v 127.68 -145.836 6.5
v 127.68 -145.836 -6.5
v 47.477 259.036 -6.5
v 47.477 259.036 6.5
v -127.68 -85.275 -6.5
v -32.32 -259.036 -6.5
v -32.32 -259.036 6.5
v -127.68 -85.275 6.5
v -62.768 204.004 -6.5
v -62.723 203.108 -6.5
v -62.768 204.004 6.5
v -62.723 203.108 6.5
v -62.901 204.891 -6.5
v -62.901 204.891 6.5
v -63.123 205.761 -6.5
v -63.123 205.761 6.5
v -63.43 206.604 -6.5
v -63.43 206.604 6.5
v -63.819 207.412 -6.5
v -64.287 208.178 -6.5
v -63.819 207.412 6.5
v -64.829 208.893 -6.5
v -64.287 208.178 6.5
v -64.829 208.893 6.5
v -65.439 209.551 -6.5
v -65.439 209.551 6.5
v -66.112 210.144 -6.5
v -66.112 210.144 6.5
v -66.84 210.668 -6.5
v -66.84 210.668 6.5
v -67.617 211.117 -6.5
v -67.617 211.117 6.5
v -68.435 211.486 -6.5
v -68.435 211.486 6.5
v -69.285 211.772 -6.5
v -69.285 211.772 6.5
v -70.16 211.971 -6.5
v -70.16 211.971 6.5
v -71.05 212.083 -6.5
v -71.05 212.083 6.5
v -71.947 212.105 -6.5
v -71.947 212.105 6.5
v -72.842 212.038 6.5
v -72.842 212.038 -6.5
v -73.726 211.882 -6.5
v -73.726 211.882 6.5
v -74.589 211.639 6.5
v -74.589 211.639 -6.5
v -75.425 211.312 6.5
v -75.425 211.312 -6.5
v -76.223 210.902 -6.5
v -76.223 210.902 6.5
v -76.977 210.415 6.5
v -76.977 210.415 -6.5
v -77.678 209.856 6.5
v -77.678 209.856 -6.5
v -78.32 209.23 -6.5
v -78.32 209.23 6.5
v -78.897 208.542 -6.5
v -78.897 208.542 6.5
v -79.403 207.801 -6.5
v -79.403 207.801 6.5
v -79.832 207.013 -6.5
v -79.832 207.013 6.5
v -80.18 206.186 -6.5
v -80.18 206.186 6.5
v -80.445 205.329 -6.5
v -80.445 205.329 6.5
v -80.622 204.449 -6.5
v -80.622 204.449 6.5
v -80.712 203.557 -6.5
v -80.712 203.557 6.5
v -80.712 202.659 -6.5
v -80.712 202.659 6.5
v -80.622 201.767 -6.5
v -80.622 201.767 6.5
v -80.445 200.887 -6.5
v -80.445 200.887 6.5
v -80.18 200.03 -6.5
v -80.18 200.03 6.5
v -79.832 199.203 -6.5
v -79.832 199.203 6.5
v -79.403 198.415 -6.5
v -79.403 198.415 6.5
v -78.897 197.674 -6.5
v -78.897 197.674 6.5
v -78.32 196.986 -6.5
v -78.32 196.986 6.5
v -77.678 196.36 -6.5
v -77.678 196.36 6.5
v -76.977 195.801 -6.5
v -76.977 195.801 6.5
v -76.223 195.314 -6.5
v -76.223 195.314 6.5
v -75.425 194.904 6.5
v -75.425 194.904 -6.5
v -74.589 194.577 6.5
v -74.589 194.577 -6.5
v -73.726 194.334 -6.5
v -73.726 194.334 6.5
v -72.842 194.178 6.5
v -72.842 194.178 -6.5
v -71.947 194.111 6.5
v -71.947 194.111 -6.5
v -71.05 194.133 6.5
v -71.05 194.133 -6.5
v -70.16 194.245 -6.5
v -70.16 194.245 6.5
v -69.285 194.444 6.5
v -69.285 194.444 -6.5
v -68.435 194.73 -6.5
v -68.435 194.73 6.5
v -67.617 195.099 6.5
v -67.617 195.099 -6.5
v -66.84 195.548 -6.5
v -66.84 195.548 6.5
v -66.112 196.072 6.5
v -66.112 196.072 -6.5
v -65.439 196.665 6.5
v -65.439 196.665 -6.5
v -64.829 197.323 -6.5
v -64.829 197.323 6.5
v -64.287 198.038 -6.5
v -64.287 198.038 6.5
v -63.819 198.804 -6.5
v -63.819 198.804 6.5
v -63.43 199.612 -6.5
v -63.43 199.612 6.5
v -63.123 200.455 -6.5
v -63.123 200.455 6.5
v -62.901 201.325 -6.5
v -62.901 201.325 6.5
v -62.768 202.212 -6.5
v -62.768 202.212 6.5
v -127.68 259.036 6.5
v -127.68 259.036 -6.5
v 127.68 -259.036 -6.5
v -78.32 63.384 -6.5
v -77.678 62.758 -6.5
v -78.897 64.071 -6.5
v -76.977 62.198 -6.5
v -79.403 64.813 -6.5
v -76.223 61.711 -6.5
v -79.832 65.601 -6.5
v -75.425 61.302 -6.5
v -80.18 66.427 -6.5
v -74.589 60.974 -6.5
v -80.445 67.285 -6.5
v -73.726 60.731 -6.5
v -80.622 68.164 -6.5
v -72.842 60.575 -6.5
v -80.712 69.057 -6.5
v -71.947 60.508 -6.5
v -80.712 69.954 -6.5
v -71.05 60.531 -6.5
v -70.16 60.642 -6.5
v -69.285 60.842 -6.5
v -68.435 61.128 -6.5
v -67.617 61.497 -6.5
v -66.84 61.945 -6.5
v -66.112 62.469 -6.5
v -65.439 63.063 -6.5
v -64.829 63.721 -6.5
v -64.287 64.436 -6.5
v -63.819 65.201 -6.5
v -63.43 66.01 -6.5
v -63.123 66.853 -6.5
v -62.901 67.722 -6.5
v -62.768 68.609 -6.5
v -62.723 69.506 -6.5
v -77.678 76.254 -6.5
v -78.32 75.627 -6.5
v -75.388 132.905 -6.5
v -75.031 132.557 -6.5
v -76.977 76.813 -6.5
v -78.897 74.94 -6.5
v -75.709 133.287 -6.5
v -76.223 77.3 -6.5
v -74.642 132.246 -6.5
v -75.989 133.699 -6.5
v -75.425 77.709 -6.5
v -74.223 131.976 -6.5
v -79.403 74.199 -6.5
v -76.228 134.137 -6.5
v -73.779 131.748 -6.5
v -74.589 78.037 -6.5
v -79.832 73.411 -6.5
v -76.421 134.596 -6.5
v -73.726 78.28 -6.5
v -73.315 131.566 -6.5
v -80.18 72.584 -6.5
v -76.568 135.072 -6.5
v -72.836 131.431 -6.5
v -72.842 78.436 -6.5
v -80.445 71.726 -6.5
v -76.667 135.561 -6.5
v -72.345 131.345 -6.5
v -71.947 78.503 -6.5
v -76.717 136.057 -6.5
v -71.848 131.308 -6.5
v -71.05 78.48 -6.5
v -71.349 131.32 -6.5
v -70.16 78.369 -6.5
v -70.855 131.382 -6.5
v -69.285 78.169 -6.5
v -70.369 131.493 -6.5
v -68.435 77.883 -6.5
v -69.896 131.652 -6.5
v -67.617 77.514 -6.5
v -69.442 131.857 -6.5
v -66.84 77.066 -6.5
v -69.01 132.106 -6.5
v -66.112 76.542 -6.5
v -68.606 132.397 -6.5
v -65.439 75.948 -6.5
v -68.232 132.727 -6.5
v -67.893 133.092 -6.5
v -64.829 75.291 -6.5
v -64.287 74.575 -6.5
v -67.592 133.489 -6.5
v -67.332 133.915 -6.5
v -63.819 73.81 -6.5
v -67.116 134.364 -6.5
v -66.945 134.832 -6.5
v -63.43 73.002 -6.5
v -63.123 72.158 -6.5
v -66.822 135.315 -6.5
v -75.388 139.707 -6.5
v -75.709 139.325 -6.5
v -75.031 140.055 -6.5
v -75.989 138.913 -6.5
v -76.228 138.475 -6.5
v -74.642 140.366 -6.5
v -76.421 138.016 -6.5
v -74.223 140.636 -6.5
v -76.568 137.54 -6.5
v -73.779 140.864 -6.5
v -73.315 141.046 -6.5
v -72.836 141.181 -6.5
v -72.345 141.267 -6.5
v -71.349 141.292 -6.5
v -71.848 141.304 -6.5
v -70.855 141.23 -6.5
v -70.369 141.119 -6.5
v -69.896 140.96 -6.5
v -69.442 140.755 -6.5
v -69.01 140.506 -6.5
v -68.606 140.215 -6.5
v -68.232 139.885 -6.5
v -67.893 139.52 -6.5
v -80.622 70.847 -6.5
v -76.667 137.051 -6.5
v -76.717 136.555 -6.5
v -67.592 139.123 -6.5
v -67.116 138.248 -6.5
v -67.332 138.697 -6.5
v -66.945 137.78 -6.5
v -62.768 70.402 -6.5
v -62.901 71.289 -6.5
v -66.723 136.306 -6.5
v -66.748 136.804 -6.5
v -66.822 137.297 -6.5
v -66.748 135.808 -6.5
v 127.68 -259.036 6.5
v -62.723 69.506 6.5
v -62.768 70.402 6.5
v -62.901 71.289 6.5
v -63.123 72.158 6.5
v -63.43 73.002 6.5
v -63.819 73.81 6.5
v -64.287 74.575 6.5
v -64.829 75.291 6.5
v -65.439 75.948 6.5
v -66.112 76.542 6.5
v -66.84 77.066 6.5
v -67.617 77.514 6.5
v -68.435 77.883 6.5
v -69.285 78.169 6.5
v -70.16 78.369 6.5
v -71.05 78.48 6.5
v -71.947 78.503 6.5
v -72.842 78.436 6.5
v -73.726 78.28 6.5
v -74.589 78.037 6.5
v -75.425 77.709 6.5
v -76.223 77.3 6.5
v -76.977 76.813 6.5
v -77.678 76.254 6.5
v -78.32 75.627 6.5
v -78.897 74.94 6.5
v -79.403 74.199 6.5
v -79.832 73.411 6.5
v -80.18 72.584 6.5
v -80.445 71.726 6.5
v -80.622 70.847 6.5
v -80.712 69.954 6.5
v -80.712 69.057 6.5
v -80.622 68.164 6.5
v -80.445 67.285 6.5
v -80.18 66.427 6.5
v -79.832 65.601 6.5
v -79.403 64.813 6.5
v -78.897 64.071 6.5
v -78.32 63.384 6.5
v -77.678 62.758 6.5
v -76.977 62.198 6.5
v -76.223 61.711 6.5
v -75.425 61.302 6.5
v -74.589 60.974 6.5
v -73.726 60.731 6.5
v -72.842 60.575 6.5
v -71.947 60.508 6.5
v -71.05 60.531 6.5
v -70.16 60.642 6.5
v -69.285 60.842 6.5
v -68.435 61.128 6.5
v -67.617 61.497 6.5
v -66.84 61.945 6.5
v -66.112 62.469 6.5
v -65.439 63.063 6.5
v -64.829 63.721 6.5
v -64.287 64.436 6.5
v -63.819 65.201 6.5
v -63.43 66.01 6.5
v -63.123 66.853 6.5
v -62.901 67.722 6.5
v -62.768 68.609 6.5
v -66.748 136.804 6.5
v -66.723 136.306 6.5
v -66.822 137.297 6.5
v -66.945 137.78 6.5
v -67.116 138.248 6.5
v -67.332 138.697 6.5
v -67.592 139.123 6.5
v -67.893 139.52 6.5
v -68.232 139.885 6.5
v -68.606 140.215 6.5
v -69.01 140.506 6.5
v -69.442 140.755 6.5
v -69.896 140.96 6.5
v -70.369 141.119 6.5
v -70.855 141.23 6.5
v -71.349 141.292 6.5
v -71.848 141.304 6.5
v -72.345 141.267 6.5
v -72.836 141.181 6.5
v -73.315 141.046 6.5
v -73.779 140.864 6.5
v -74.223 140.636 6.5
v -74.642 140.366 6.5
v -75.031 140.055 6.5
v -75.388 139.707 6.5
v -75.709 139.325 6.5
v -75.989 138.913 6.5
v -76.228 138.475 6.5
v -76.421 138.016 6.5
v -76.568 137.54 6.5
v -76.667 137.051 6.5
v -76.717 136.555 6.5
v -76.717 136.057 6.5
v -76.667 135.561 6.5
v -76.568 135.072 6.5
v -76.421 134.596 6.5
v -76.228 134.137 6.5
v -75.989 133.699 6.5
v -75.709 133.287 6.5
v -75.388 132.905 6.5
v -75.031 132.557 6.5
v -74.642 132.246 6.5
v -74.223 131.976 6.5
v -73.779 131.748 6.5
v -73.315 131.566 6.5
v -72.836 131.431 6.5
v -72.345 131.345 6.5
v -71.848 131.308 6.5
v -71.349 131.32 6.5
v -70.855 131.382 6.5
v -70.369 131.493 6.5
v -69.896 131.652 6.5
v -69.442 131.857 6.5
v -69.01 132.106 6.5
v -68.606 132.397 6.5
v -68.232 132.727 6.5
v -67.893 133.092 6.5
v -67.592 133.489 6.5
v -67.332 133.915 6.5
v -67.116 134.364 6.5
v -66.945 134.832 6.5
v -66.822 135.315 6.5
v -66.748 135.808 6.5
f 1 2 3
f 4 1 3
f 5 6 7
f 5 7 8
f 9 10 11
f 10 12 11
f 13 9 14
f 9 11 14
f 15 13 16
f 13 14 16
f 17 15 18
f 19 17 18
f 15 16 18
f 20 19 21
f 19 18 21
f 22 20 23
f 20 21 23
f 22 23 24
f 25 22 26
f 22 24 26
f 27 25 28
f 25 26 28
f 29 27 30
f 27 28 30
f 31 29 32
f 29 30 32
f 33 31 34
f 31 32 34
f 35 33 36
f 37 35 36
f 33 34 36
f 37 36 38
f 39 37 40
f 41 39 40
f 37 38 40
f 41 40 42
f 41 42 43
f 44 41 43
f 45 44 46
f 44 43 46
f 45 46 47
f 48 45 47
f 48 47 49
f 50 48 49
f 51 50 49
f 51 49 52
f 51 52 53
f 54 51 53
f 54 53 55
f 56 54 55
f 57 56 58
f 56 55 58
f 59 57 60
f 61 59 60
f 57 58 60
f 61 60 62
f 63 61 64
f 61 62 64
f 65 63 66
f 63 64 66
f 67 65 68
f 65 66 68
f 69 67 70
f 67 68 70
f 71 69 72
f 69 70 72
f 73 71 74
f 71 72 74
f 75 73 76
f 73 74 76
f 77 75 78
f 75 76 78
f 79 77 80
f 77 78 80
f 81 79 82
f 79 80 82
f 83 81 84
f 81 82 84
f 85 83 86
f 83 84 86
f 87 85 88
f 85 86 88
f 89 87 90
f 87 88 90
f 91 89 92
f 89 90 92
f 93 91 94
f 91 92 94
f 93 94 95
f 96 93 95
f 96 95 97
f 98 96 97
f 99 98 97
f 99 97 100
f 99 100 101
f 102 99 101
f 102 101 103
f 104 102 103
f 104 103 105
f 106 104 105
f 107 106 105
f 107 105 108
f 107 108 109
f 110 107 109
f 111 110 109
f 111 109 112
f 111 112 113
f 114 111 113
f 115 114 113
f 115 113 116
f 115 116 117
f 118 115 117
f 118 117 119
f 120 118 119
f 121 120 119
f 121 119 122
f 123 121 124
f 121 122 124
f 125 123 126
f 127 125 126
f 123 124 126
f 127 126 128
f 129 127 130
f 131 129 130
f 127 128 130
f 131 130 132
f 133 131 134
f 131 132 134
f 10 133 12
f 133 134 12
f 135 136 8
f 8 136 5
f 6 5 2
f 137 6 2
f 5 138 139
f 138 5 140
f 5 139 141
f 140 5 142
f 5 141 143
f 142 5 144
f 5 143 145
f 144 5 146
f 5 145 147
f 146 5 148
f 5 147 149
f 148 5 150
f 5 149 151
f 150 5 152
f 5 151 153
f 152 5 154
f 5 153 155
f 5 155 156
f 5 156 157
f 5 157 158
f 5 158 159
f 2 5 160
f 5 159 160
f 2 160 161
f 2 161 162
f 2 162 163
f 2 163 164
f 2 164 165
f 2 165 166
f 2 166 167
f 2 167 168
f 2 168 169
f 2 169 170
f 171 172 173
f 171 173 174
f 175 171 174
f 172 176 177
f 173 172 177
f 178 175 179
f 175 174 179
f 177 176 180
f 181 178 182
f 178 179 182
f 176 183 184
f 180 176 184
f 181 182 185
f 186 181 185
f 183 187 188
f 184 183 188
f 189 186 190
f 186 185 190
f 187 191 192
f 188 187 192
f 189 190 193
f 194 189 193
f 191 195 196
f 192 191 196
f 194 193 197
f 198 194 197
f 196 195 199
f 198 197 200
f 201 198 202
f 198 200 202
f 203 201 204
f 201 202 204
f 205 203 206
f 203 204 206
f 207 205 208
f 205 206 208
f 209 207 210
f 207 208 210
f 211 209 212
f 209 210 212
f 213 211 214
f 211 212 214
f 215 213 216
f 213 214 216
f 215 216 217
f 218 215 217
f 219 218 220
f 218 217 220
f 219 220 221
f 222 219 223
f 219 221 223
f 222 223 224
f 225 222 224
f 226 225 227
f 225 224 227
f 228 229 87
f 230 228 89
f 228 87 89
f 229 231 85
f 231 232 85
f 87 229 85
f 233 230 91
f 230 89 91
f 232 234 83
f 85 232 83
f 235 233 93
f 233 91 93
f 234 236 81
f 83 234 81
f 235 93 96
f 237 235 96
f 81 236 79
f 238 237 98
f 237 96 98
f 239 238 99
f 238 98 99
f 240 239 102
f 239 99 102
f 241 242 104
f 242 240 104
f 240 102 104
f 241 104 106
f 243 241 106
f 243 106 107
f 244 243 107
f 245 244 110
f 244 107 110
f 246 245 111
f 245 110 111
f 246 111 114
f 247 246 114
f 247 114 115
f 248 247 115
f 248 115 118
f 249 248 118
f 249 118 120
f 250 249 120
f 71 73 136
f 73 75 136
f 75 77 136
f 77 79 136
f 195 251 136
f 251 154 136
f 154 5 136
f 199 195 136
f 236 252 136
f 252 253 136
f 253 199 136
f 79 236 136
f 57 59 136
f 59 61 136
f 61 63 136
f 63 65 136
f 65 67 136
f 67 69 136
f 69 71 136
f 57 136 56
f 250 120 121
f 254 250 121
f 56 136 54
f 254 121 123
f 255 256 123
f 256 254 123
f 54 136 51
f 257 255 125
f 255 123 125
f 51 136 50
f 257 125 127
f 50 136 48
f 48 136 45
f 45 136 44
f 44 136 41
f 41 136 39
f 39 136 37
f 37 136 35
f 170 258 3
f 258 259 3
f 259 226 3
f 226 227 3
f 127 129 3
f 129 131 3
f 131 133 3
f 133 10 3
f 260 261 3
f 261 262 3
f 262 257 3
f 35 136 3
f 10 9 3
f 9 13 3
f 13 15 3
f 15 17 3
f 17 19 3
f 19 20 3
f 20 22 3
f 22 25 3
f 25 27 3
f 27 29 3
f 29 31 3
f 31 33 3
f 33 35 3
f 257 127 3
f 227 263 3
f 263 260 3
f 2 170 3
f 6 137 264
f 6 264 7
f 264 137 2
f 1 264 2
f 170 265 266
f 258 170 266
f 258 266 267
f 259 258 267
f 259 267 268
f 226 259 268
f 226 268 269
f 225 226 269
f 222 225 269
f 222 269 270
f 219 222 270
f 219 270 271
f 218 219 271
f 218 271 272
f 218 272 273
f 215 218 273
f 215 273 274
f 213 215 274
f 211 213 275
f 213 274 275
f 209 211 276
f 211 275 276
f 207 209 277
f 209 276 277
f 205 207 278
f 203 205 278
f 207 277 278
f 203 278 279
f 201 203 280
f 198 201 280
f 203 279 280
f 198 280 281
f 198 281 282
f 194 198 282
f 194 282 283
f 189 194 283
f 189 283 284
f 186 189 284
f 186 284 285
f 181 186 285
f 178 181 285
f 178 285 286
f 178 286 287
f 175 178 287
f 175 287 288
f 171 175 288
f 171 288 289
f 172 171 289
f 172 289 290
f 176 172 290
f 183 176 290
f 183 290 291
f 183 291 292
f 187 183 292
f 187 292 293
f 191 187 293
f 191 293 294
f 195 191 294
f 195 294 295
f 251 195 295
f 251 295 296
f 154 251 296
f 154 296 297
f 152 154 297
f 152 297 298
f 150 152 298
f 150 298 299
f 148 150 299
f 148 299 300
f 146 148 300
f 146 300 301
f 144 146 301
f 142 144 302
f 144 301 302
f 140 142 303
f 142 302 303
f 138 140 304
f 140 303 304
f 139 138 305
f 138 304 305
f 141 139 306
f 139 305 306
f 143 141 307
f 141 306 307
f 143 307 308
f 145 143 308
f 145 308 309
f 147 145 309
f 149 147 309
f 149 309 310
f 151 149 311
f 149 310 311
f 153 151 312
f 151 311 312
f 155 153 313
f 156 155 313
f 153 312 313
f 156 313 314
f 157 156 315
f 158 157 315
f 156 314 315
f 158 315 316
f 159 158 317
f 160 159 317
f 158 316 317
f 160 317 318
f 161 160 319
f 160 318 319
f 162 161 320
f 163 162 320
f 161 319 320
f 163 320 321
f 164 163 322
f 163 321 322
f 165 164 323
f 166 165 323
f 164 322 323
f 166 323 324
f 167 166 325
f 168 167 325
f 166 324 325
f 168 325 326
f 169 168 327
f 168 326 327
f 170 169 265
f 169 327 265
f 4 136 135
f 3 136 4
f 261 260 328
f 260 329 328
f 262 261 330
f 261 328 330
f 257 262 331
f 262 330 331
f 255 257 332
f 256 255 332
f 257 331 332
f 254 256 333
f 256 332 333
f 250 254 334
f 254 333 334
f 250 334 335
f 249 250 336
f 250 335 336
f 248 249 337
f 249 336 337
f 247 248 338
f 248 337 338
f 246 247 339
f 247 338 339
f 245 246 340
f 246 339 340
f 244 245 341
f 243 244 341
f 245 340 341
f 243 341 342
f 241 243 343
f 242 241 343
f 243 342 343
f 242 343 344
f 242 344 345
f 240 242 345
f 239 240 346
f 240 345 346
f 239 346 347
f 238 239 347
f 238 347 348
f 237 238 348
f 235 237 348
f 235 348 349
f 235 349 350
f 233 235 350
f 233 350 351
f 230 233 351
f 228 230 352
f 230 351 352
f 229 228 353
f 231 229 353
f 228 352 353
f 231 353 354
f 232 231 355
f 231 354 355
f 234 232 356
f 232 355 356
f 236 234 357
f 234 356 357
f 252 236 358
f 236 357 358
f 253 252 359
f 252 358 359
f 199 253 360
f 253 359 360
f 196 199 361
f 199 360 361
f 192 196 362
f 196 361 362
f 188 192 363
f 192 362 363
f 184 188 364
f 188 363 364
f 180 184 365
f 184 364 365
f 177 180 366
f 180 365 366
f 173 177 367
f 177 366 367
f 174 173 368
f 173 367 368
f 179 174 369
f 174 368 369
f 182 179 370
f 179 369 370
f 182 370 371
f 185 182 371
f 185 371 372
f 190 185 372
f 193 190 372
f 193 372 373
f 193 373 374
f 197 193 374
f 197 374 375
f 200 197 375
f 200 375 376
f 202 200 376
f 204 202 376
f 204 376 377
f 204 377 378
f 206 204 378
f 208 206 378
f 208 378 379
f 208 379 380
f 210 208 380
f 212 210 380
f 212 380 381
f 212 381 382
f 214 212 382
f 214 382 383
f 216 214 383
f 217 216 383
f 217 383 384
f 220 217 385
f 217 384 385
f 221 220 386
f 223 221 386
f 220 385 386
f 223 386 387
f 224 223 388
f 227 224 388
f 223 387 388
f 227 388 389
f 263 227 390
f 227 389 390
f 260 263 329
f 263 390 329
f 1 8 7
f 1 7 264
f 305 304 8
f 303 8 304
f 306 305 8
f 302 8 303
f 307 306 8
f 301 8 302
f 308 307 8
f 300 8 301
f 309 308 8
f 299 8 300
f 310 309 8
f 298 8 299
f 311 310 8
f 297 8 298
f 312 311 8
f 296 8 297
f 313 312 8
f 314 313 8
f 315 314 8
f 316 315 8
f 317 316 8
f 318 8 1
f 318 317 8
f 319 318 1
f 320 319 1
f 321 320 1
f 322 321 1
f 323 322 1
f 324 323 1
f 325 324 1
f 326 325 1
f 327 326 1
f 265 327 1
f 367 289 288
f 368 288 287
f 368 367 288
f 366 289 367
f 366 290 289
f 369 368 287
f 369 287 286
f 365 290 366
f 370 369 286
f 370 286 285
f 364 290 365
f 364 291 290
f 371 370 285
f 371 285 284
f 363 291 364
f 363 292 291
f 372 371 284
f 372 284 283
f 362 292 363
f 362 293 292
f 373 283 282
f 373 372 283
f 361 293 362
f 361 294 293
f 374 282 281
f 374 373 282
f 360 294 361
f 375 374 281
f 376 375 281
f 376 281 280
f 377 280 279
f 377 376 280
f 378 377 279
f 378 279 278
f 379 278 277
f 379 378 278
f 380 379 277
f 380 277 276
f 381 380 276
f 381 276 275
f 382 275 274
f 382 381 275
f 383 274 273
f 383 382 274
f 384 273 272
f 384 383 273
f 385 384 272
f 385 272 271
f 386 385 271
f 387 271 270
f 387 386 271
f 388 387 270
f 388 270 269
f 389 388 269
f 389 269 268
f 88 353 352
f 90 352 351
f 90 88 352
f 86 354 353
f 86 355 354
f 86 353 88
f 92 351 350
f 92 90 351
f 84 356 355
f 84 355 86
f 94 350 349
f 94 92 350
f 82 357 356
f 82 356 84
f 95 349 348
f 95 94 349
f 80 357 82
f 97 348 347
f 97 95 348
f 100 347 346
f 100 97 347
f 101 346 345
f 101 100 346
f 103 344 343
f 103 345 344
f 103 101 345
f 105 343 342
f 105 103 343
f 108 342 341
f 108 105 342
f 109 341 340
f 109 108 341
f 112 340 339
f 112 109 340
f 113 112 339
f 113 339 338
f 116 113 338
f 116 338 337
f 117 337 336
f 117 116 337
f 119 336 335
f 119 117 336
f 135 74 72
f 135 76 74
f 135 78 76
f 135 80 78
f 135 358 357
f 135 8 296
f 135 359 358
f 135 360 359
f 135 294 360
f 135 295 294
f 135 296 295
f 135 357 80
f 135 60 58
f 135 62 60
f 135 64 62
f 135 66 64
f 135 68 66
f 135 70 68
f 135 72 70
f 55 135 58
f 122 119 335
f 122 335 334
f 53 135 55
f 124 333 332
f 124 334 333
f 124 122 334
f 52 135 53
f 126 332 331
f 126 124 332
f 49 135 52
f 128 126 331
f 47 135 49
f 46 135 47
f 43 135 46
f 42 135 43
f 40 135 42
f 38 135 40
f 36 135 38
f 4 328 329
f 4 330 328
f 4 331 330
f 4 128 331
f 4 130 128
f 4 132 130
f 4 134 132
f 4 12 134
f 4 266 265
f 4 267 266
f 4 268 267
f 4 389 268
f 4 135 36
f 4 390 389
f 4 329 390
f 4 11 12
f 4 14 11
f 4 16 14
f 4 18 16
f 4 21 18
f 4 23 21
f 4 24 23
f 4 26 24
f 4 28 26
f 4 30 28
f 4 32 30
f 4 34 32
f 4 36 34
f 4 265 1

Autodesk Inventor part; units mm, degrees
ref_plane "YZ Plane" through (0, 0, 0) normal (1, 0, 0) x (0, 1, 0)
ref_plane "XZ Plane" through (0, 0, 0) normal (0, 1, 0) x (-1, 0, 0)
ref_plane "XY Plane" through (0, 0, 0) normal (0, 0, 1) x (1, 0, 0)
sketch "Sketch1" plane through (0, 0, 0) normal (0, 0, 1) x (1, 0, 0)
  line L0 (-127.68, 259.036) -> (-127.68, -85.275)
  line L1 (-127.68, 259.036) -> (47.477, 259.036)
  line L2 (127.68, -259.036) -> (-32.32, -259.036)
  line L3 (-32.32, -259.036) -> (-127.68, -85.275)
  line L4 (127.68, -259.036) -> (127.68, -145.836)
  line L5 (127.68, -145.836) -> (47.477, 259.036)
  point P0 (0, 0)
  dimension "d6" = 344.311
  dimension "d7" = 175.157
  dimension "d9" = 160
  dimension "d10" = 113.2
extrude "Extrusion1" add sketch "Sketch1" along normal mid plane 13
sketch "Sketch2" plane through (0, 0, 6.5) normal (0, 0, 1) x (1, 0, 0)
  circle A0 centre (-71.723, 203.108) radius 9
  circle A1 centre (-71.723, 69.5056) radius 9
  line L0 (47.477, 259.036) -> (-127.68, 259.036) projected
  line L1 (-127.68, 259.036) -> (-127.68, -85.275) projected
  circle A2 centre (-71.723, 136.306) radius 5
  point P0 (0, 0)
  dimension "d17" = 55.957
  dimension "d39" = 10
  dimension "d43" = 55.928
  dimension "d44" = 66.8004
  dimension "d45" = 66.802
extrude "Extrusion4" cut sketch "Sketch2" against normal blind 25.4
properties part number "CNC-X-axis- side plates"
